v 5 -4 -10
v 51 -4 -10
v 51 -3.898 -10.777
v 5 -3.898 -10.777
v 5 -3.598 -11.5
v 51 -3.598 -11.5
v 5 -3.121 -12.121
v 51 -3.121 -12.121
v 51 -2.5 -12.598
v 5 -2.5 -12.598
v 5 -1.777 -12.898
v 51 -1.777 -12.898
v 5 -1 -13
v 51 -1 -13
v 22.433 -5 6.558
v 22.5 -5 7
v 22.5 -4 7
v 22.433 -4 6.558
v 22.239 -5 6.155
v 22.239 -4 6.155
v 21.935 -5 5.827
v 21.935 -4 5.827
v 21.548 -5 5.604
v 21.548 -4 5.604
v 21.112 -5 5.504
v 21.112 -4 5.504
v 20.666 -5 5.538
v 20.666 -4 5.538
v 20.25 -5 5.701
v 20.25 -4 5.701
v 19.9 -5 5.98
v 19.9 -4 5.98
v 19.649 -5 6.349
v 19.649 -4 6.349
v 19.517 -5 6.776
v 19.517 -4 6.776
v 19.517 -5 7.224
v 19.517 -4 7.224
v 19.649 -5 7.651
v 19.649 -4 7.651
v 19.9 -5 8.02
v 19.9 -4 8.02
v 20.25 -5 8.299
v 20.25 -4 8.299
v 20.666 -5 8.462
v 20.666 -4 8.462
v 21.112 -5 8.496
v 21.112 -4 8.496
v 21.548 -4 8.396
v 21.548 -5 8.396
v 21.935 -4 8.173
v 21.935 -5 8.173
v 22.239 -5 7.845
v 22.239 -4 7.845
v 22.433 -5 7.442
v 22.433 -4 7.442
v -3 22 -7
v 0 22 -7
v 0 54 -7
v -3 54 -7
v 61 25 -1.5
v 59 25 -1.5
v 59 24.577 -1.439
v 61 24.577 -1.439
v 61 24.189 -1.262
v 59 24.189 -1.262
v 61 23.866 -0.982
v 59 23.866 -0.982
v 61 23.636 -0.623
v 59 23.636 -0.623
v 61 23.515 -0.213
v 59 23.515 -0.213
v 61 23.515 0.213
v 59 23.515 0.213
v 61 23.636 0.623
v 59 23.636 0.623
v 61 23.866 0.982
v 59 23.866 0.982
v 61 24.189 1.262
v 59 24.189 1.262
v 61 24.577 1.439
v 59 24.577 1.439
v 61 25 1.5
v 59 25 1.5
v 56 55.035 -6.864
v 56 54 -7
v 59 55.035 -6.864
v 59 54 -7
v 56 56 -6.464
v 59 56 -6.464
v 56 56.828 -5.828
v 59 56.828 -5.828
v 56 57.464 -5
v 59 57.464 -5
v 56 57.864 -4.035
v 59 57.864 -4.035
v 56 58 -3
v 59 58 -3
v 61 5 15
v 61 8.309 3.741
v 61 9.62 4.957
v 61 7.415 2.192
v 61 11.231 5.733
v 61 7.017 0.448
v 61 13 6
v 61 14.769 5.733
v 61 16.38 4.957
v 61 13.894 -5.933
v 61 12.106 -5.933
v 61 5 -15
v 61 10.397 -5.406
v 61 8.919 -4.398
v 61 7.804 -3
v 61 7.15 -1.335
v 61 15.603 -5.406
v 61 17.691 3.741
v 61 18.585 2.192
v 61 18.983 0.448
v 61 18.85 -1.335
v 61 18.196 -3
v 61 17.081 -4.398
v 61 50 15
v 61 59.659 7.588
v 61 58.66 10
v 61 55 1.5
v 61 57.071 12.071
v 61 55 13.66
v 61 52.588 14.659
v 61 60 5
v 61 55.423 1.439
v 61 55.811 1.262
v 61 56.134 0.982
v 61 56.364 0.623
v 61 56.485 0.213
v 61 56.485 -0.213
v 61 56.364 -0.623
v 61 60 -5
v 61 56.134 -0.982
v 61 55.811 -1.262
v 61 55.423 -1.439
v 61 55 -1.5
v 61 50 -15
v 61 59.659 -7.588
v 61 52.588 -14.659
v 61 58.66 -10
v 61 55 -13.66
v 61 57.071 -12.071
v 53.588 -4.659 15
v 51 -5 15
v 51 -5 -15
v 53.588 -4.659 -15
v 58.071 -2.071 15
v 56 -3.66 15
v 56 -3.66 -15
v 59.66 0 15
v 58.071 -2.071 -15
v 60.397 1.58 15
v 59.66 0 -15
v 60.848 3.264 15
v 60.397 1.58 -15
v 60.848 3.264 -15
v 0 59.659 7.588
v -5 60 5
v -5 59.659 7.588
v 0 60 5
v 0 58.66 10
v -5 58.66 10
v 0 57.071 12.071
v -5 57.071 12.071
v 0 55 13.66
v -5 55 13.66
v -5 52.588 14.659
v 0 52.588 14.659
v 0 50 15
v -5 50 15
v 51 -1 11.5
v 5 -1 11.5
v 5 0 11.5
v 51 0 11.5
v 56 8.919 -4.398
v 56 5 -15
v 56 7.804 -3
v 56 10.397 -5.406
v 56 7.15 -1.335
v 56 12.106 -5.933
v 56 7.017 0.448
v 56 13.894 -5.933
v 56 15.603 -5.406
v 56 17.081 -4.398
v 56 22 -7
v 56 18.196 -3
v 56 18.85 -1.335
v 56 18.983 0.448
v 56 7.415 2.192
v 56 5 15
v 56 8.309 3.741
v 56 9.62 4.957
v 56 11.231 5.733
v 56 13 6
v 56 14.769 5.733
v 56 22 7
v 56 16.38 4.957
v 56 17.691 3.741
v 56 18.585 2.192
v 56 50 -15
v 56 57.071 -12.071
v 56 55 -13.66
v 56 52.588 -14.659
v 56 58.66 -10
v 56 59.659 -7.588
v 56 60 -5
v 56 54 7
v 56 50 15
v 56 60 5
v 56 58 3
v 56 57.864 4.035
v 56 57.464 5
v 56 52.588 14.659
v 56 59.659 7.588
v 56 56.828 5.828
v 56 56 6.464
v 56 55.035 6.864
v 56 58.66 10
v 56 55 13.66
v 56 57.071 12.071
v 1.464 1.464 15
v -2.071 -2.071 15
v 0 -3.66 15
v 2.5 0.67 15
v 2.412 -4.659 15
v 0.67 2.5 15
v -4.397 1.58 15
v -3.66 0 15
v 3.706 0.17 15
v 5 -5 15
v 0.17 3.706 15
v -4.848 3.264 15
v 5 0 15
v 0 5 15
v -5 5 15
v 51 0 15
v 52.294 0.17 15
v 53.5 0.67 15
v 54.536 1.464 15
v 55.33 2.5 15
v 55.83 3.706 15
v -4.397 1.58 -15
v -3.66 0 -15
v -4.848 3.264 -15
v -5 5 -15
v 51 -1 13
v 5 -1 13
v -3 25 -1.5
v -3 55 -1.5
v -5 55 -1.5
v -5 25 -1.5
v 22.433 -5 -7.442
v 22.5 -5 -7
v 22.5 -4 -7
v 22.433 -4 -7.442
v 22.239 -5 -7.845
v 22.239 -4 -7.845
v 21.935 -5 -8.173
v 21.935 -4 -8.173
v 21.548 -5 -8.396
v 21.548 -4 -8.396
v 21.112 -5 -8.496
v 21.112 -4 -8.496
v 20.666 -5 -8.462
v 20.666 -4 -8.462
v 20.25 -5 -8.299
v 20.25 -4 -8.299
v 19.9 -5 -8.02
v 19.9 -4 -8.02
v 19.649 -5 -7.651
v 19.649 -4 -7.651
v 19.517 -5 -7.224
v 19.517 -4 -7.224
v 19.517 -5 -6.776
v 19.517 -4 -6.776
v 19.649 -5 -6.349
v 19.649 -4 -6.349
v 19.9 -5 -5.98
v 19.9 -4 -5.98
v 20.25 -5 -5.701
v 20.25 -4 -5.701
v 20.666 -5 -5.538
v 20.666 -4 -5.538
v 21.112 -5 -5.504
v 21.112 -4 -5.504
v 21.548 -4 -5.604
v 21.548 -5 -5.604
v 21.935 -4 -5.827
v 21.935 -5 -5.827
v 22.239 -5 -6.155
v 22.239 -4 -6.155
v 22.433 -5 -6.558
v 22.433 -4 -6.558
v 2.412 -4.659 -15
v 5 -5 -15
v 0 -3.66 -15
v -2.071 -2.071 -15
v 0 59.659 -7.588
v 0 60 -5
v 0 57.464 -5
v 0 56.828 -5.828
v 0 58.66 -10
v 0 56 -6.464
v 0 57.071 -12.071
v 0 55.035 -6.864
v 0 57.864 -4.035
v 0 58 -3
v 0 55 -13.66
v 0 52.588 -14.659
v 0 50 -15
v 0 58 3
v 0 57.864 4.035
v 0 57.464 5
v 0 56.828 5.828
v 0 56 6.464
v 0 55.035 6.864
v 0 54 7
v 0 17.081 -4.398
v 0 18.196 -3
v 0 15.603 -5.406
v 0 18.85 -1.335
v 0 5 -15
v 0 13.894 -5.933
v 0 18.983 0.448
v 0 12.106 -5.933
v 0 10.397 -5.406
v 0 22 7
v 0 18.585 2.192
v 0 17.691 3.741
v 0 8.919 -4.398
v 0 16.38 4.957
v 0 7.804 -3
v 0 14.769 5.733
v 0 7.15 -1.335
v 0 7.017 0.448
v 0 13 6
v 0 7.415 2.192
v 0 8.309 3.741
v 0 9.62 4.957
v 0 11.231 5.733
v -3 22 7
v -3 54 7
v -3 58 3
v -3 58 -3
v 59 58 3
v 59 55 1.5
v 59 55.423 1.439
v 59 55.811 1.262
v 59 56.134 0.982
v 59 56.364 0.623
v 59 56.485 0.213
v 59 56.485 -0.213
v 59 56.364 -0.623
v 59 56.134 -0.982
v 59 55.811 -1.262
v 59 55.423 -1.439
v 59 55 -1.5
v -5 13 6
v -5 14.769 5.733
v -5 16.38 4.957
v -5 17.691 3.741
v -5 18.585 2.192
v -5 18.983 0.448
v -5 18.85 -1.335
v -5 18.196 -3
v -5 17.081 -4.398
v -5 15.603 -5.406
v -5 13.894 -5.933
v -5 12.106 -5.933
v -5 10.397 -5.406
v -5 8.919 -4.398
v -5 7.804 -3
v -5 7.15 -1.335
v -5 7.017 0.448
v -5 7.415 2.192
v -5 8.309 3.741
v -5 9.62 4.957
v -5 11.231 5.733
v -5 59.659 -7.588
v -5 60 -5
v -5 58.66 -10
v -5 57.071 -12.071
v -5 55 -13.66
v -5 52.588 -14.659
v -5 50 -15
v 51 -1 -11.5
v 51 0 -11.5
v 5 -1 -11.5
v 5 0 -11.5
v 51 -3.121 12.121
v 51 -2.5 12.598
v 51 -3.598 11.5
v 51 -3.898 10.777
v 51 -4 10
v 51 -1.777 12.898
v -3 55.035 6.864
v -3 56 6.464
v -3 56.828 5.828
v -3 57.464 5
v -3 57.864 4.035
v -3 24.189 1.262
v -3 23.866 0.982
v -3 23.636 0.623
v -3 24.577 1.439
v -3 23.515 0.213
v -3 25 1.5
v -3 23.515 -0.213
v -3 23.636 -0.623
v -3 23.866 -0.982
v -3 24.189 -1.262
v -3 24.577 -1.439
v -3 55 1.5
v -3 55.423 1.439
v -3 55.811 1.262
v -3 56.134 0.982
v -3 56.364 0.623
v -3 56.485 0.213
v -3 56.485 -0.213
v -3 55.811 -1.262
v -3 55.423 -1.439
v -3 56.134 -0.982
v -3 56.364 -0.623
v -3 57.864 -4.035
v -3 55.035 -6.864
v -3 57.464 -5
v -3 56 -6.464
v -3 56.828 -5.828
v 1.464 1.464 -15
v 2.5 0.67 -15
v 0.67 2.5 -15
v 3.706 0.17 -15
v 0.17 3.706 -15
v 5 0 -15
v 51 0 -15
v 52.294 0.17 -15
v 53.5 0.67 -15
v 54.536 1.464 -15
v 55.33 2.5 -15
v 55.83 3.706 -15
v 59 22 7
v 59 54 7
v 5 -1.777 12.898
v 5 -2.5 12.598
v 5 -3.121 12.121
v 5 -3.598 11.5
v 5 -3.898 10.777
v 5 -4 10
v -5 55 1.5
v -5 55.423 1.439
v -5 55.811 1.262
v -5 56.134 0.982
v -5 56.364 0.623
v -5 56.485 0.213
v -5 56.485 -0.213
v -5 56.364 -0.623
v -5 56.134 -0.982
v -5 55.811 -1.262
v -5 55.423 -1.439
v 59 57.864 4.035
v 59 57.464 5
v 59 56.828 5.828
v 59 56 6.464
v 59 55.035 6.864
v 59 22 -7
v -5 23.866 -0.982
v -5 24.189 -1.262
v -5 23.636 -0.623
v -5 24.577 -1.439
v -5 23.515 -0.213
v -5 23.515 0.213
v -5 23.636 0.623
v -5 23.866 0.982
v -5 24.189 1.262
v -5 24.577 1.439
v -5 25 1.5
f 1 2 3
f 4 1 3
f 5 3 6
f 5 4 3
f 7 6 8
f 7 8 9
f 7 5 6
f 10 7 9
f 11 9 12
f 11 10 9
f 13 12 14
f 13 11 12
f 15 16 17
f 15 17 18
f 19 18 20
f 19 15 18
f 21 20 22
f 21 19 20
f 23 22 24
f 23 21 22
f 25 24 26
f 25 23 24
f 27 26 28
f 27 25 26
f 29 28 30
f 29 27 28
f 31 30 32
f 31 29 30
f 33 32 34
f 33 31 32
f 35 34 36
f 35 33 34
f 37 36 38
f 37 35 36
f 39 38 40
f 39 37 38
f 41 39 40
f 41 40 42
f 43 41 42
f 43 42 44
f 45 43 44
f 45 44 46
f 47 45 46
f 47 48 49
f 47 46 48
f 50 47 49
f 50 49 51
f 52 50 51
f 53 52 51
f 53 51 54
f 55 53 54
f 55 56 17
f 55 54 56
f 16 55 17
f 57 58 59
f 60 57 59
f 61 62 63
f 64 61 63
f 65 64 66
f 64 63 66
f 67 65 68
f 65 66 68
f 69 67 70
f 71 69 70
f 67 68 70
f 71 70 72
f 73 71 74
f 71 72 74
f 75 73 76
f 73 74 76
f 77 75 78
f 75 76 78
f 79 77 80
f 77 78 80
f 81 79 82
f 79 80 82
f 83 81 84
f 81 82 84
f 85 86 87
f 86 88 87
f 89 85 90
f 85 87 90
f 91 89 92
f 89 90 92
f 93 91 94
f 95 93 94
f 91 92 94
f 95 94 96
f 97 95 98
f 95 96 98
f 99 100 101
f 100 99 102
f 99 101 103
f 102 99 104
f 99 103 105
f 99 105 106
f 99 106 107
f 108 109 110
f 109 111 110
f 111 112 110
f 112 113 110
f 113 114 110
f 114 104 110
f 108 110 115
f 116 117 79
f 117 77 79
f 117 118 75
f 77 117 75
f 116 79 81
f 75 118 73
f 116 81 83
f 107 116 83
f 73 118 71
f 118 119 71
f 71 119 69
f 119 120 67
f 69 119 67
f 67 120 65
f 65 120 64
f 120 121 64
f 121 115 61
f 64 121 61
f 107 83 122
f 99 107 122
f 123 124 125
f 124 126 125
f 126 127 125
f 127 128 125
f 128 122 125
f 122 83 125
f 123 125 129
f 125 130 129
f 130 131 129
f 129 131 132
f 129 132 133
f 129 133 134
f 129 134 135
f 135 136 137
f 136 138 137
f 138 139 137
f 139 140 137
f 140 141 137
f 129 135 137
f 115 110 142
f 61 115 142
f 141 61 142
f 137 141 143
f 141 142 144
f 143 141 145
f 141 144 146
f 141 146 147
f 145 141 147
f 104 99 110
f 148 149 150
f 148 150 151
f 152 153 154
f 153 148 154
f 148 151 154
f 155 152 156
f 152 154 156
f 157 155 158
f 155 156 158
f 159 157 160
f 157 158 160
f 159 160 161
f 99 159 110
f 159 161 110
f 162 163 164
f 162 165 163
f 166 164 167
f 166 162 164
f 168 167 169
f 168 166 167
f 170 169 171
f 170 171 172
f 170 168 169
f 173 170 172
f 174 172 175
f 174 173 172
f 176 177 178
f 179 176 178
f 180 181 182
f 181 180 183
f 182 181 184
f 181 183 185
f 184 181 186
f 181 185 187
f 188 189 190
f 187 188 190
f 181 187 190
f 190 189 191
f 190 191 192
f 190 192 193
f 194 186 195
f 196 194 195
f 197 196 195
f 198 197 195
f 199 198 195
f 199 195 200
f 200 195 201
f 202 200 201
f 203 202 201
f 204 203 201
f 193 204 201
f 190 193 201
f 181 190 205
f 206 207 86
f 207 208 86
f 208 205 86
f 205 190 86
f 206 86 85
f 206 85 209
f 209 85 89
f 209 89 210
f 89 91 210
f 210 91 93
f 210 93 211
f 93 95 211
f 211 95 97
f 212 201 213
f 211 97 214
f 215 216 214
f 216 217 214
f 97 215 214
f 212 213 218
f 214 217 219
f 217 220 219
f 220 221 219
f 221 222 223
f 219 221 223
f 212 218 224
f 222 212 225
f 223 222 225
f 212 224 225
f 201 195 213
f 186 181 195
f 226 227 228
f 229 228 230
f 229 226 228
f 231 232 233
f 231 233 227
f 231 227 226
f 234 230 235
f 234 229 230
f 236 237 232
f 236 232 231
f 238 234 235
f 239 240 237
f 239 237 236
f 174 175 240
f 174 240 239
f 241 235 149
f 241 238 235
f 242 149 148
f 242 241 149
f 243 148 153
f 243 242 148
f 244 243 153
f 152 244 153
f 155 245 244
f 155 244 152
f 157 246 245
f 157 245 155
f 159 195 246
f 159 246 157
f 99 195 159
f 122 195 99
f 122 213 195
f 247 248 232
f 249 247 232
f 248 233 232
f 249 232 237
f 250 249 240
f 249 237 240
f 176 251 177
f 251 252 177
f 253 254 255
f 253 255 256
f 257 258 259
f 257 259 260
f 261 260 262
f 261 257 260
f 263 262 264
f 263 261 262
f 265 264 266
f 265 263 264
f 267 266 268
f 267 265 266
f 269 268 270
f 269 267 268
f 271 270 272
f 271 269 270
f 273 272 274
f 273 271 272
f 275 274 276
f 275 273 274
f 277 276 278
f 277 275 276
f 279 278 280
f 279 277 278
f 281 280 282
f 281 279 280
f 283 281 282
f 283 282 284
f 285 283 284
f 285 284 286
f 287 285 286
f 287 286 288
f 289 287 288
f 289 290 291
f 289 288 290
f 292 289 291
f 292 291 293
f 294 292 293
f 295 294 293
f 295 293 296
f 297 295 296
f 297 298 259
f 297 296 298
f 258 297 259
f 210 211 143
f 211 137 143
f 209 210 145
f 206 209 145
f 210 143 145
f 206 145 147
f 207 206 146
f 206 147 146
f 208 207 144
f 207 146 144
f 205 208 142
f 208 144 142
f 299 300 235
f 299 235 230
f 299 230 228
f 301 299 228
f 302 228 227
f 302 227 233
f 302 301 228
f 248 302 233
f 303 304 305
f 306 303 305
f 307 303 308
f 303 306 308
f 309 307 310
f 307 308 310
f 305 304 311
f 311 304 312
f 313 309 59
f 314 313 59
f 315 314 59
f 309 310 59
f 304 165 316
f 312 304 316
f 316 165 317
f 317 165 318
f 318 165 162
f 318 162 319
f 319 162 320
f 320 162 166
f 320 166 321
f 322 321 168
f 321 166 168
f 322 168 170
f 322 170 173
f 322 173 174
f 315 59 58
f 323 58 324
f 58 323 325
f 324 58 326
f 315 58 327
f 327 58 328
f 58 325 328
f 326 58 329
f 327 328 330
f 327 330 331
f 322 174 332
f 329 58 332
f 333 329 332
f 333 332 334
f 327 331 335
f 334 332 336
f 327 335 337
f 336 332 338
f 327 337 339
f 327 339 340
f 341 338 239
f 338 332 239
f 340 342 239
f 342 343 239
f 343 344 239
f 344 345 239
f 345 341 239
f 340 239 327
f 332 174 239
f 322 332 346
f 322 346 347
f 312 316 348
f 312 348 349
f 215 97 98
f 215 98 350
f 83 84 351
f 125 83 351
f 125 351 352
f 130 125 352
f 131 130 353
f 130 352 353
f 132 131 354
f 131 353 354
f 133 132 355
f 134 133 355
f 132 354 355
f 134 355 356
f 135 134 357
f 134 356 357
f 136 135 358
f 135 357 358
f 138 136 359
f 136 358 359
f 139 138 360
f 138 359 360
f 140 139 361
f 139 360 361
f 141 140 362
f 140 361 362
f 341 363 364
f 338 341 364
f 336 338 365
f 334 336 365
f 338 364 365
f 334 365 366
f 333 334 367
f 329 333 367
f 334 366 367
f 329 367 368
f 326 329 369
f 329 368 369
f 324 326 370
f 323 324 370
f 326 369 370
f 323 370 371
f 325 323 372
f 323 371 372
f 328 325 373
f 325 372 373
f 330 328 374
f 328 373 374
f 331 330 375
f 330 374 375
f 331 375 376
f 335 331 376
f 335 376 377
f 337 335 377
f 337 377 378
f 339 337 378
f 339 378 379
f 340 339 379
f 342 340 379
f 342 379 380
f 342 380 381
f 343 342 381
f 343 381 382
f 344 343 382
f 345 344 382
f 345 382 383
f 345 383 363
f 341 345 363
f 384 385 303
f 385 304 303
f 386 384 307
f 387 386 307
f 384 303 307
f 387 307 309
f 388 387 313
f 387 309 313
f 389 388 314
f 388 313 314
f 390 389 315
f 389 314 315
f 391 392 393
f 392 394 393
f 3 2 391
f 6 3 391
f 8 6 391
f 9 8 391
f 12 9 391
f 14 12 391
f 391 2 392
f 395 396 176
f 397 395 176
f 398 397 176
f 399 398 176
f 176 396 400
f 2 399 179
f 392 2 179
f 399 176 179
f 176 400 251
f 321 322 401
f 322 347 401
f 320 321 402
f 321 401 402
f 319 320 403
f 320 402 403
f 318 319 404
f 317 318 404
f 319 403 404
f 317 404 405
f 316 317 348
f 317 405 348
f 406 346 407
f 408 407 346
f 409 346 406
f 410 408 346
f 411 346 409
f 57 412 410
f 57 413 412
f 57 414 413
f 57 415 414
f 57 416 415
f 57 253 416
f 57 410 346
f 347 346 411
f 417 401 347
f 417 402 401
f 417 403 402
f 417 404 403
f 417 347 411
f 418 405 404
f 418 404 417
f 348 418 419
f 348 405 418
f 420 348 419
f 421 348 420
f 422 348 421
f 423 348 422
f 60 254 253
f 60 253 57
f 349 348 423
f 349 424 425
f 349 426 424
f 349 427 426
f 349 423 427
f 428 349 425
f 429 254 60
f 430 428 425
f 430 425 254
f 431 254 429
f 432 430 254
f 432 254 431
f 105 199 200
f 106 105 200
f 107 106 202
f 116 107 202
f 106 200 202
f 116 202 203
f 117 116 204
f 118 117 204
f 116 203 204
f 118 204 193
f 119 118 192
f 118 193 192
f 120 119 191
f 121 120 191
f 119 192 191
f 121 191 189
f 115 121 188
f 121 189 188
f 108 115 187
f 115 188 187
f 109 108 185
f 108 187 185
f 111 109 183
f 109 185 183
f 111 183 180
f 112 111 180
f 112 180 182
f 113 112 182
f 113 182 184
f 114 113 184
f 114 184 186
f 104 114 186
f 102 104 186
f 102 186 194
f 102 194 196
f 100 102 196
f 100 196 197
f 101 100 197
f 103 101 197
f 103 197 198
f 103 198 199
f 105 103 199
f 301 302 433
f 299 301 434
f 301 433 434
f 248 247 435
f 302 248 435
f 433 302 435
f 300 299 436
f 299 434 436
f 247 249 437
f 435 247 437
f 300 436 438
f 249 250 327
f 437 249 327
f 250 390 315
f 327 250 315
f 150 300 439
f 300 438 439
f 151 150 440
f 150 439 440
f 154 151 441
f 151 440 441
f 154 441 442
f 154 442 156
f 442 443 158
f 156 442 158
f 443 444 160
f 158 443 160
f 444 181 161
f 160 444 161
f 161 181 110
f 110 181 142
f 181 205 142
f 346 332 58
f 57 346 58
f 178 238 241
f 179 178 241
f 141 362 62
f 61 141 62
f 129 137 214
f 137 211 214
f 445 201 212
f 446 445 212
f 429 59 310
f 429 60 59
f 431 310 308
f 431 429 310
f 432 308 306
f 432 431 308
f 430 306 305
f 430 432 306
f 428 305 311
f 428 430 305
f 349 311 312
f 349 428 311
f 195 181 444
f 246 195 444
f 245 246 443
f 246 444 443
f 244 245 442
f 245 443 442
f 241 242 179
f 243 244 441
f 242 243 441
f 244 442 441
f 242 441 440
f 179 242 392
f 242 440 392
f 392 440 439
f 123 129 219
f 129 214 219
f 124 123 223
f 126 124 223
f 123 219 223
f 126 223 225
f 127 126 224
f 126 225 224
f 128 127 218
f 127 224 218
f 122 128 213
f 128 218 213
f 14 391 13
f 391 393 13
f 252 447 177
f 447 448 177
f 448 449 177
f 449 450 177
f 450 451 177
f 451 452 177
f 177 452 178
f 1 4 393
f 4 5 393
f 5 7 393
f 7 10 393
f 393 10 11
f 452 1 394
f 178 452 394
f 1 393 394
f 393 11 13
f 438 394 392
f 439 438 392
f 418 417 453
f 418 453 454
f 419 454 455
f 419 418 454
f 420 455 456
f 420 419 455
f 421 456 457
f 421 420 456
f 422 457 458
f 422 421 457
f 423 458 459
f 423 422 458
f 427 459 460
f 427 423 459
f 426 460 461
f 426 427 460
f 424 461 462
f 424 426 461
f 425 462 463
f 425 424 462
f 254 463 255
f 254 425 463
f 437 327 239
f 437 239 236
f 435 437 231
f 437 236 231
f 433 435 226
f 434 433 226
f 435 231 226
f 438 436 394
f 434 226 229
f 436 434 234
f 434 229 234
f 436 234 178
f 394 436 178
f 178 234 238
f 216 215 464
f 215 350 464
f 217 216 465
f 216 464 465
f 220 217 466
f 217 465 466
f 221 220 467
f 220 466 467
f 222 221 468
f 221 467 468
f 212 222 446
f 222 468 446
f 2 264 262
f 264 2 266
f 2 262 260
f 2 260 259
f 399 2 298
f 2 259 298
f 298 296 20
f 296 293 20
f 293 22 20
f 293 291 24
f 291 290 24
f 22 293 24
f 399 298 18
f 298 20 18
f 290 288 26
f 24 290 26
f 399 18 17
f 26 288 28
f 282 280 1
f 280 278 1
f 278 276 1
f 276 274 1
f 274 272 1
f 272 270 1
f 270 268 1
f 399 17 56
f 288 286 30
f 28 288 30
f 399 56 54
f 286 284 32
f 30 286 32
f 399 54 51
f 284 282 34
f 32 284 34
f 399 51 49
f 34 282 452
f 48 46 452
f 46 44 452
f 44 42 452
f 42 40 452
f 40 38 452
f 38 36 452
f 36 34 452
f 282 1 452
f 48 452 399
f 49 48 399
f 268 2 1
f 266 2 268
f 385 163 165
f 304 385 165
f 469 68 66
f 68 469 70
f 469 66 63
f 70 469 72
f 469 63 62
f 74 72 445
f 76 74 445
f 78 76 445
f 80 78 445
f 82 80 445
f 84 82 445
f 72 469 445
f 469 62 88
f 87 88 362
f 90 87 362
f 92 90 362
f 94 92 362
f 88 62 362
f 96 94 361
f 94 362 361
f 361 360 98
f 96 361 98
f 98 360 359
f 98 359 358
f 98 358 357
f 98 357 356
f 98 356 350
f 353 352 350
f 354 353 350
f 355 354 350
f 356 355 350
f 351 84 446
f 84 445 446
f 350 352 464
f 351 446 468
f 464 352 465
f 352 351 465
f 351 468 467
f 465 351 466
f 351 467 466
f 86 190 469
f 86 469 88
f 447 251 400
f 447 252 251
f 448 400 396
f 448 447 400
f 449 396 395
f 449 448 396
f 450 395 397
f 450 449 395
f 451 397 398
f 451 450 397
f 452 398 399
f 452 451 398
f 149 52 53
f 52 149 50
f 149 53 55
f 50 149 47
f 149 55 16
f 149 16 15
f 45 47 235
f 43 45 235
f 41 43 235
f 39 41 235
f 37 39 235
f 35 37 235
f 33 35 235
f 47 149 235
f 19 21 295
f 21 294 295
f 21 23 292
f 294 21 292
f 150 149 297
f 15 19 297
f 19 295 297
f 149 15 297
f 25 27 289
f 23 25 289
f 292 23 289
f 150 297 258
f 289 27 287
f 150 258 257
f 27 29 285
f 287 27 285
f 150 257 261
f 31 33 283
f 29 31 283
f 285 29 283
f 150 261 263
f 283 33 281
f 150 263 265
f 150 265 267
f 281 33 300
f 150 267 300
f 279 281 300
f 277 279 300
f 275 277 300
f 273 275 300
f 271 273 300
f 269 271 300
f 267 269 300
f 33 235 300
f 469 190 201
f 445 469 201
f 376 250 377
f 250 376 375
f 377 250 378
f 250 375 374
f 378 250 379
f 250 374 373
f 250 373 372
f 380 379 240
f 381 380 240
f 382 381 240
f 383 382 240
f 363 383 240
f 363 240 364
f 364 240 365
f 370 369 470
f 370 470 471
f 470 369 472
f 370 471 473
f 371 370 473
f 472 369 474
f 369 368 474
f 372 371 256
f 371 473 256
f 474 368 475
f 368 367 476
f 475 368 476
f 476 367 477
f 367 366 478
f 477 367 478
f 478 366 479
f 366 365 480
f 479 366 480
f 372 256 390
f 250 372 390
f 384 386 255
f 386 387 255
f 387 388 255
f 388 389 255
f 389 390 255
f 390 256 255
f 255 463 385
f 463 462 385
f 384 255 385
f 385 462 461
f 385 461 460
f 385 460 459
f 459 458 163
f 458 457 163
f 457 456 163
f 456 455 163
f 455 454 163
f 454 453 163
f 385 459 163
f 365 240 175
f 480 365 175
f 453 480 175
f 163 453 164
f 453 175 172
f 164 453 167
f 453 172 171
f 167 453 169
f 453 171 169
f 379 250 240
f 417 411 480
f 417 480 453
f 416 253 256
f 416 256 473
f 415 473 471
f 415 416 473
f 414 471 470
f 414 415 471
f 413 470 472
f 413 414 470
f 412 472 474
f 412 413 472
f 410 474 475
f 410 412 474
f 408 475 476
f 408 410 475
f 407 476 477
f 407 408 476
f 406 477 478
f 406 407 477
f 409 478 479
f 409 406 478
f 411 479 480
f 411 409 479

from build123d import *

# Parameters (mm, degrees)
BOSS_EXTRUDE1_DEPTH   = 15
CUT_EXTRUDE1_DEPTH    = 30
SKETCH5_W             = 14
SKETCH5_H             = 36
CUT_EXTRUDE2_DEPTH    = 3
SKETCH7_R             = 1.5
CUT_EXTRUDE3_DEPTH    = 90
MIRROR1_START         = -4
MIRROR1_DEPTH         = 9
MIRROR1_START_2       = 56
MIRROR1_2_OUTLINE_W   = 60
MIRROR1_2_OUTLINE_H   = 30
MIRROR1_2_OUTLINE_W_2 = 36
MIRROR1_2_OUTLINE_H_2 = 14
MIRROR1_2_DEPTH       = 3
MIRROR1_START_3       = 59
MIRROR1_3_OUTLINE_W   = 36
MIRROR1_3_OUTLINE_H   = 14
MIRROR1_3_DEPTH       = 2
MIRROR1_4_DEPTH       = 9
MIRROR1_START_4       = 51
MIRROR1_5_DEPTH       = 4.358898944
MIRROR1_START_5       = 22.5000001
MIRROR1_6_DEPTH       = 28.4999999
MIRROR1_START_6       = -15
MIRROR1_7_OUTLINE_W   = 2
MIRROR1_7_OUTLINE_H   = 2
MIRROR1_7_DEPTH       = 30
MIRROR1_8_OUTLINE_W   = 2
MIRROR1_8_OUTLINE_H   = 36
MIRROR1_8_DEPTH       = 8
MIRROR1_START_7       = 7
MIRROR1_9_OUTLINE_W   = 2
MIRROR1_9_OUTLINE_H   = 36
MIRROR1_9_DEPTH       = 8
MIRROR1_START_8       = -6
MIRROR1_10_OUTLINE_R  = 1.5
MIRROR1_10_DEPTH      = 3
CUT_EXTRUDE5_START    = -70
CUT_EXTRUDE5_DEPTH    = 70
BOSS_EXTRUDE2_START   = -28
BOSS_EXTRUDE2_DEPTH   = 26
FILLET1_R             = 10
FILLET2_R             = 4
FILLET3_R             = 3
SKETCH9_R             = 6
CUT_EXTRUDE6_DEPTH    = 83


with BuildPart() as part:
    # Sketch1 → Boss-Extrude1 (new, symmetric)
    with BuildSketch(Plane.XY):
        with BuildLine():
            Line((5, 0), (60, 0))
            Line((60, 0), (60, -5))
            Line((60, -5), (5, -5))
            ThreePointArc((5, -5), (-2.071067812, -2.071067812), (-5, 5))
            Line((-5, 5), (-5, 60))
            Line((-5, 60), (0, 60))
            Line((0, 60), (0, 5))
            ThreePointArc((0, 5), (1.464466094, 1.464466094), (5, 0))
        make_face()
    extrude(amount=BOSS_EXTRUDE1_DEPTH, both=True)

    # Cut-Sweep1: sweep along a path in Sketch3
    with BuildLine(Plane(origin=(0, 0, 0), x_dir=(1, 0, 0), z_dir=(0, 1, 0))) as cut_sweep1_path:
        Line((60, 0), (5, 0))
    # Sketch2 → Cut-Sweep1 (sweep, cut)
    with BuildSketch(Plane(origin=(60, 0, 0), x_dir=(0, 0, -1), z_dir=(1, 0, 0))):
        Polygon((-11.5, 0), (-11.5, -1), (-13, -1), (-13, -4), (13, -4), (13, -1), (11.5, -1), (11.5, 0), align=None)
    sweep(path=cut_sweep1_path.line, mode=Mode.SUBTRACT)

    # Sketch4 → Cut-Extrude1 (cut)
    with BuildSketch(Plane(origin=(0, 0, 0), x_dir=(0, 0, -1), z_dir=(1, 0, 0))):
        with BuildLine():
            Line((1.5, 55), (1.5, 25))
            ThreePointArc((1.5, 25), (0, 23.5), (-1.5, 25))
            Line((-1.5, 25), (-1.5, 55))
            ThreePointArc((-1.5, 55), (0, 56.5), (1.5, 55))
        make_face()
    extrude(amount=-CUT_EXTRUDE1_DEPTH, mode=Mode.SUBTRACT)

    # Sketch5 → Cut-Extrude2 (cut)
    with BuildSketch(Plane(origin=(0, 0, 0), x_dir=(0, 0, -1), z_dir=(1, 0, 0))):
        with Locations((0, 40)):
            Rectangle(SKETCH5_W, SKETCH5_H)
    extrude(amount=-CUT_EXTRUDE2_DEPTH, mode=Mode.SUBTRACT)

    # Sketch7 → Cut-Extrude3 (cut, through all)
    with BuildSketch(Plane(origin=(0, -4, 0), x_dir=(1, 0, 0), z_dir=(0, 1, 0))):
        with Locations(Location((35, 7, 0), (0, 0, 270))):
            Circle(SKETCH7_R)
        with Locations(Location((35, -7, 0), (0, 0, 270))):
            Circle(SKETCH7_R)
    extrude(amount=-CUT_EXTRUDE3_DEPTH, mode=Mode.SUBTRACT)

    # Mirror1: read off the stored shape, not the designer's step
    # Mirror1 outline → Mirror1 (cut)
    with BuildSketch(Plane.YZ.offset(MIRROR1_START)):
        Polygon((0, -11.5), (0, 11.5), (-1, 11.5), (-1, 13), (-4, 13), (-4, -13), (-1, -13), (-1, -11.5), align=None)
    extrude(amount=MIRROR1_DEPTH, mode=Mode.SUBTRACT)

    # Mirror1 2 outline → Mirror1 2 (add)
    with BuildSketch(Plane.YZ.offset(MIRROR1_START_2)):
        with Locations((30, 0)):
            Rectangle(MIRROR1_2_OUTLINE_W, MIRROR1_2_OUTLINE_H)
        with Locations((40, 0)):
            Rectangle(MIRROR1_2_OUTLINE_W_2, MIRROR1_2_OUTLINE_H_2, mode=Mode.SUBTRACT)
    extrude(amount=MIRROR1_2_DEPTH)

    # Mirror1 3 outline → Mirror1 3 (add)
    with BuildSketch(Plane.YZ.offset(MIRROR1_START_3)):
        with Locations((40, 0)):
            Rectangle(MIRROR1_3_OUTLINE_W, MIRROR1_3_OUTLINE_H)
        with BuildLine():
            Line((25, 1.5), (55, 1.5))
            ThreePointArc((55, 1.5), (56.5, 0), (55, -1.5))
            Line((55, -1.5), (25, -1.5))
            ThreePointArc((25, -1.5), (23.5, 0), (25, 1.5))
        make_face(mode=Mode.SUBTRACT)
    extrude(amount=MIRROR1_3_DEPTH)

    # Mirror1 4 outline → Mirror1 4 (add)
    with BuildSketch(Plane.YZ.offset(MIRROR1_START)):
        Polygon((-1, 11.5), (0, 11.5), (0, 15), (-5, 15), (-5, -15), (0, -15), (0, -11.5), (-1, -11.5), (-1, -13), (-4, -13), (-4, 13), (-1, 13), align=None)
    extrude(amount=MIRROR1_4_DEPTH)

    # Mirror1 5 outline → Mirror1 5 (add)
    with BuildSketch(Plane.YZ.offset(MIRROR1_START_4)):
        Polygon((0, -11.5), (0, 11.5), (-1, 11.5), (-1, 13), (-4, 13), (-4, -13), (-1, -13), (-1, -11.5), align=None)
    extrude(amount=MIRROR1_5_DEPTH)

    # Mirror1 6 outline → Mirror1 6 (add)
    with BuildSketch(Plane.YZ.offset(MIRROR1_START_5)):
        Polygon((-1, 11.5), (0, 11.5), (0, 15), (-5, 15), (-5, -15), (0, -15), (0, -11.5), (-1, -11.5), (-1, -13), (-4, -13), (-4, 13), (-1, 13), align=None)
    extrude(amount=MIRROR1_6_DEPTH)

    # Mirror1 7 outline → Mirror1 7 (add)
    with BuildSketch(Plane.XY.offset(MIRROR1_START_6)):
        with BuildLine():
            Line((56, 0), (56, 5))
            ThreePointArc((56, 5), (54.535533906, 1.464466094), (51, 0))
            Line((51, 0), (55.358898944, 0))
            Line((55.358898944, 0), (55.358898944, -4))
            ThreePointArc((55.358898944, -4), (59.473163206, -0.310885546), (61, 5))
            Line((61, 5), (61, 22))
            Line((61, 22), (59, 22))
            Line((59, 22), (59, 0))
            Line((59, 0), (56, 0))
        make_face()
        with Locations((60, 59)):
            Rectangle(MIRROR1_7_OUTLINE_W, MIRROR1_7_OUTLINE_H)
    extrude(amount=MIRROR1_7_DEPTH)

    # Mirror1 8 outline → Mirror1 8 (add)
    with BuildSketch(Plane.XY.offset(MIRROR1_START_6)):
        with Locations((60, 40)):
            Rectangle(MIRROR1_8_OUTLINE_W, MIRROR1_8_OUTLINE_H)
    extrude(amount=MIRROR1_8_DEPTH)

    # Mirror1 9 outline → Mirror1 9 (add)
    with BuildSketch(Plane.XY.offset(MIRROR1_START_7)):
        with Locations((60, 40)):
            Rectangle(MIRROR1_9_OUTLINE_W, MIRROR1_9_OUTLINE_H)
    extrude(amount=MIRROR1_9_DEPTH)

    # Mirror1 10 outline → Mirror1 10 (cut)
    with BuildSketch(Plane(origin=(0, 0, 0), x_dir=(1, 0, 0), z_dir=(0, 1, 0)).offset(MIRROR1_START_8)):
        with Locations((21, -7)):
            Circle(MIRROR1_10_OUTLINE_R)
        with Locations((21, 7)):
            Circle(MIRROR1_10_OUTLINE_R)
    extrude(amount=MIRROR1_10_DEPTH, mode=Mode.SUBTRACT)

    # Sketch8 → Cut-Extrude5 (cut)
    with BuildSketch(Plane.XY.offset(15).offset(CUT_EXTRUDE5_START)):
        with BuildLine():
            Line((65.755683461, 5), (61, 5))
            ThreePointArc((61, 5), (60.659258263, 2.411809549), (59.660254038, 0))
            Line((59.660254038, 0), (60, 0))
            Line((60, 0), (60, -5))
            Line((60, -5), (51, -5))
            Line((51, -5), (51, -9.755683461))
            ThreePointArc((51, -9.755683461), (61.433843836, -5.433843836), (65.755683461, 5))
        make_face()
        with BuildLine():
            ThreePointArc((59.660254038, 0), (56, -3.660254038), (51, -5))
            Line((51, -5), (60, -5))
            Line((60, -5), (60, 0))
            Line((60, 0), (59.660254038, 0))
        make_face()
        with BuildLine():
            Line((-4, -5), (5, -5))
            ThreePointArc((5, -5), (0, -3.660254038), (-3.660254038, 0))
            Line((-3.660254038, 0), (-4, 0))
            Line((-4, 0), (-4, -5))
        make_face()
    extrude(amount=CUT_EXTRUDE5_DEPTH, mode=Mode.SUBTRACT)

    # Sketch8<3> → Boss-Extrude2 (add)
    with BuildSketch(Plane.XY.offset(15).offset(BOSS_EXTRUDE2_START)):
        with BuildLine():
            ThreePointArc((-3.660254038, 0), (0, -3.660254038), (5, -5))
            Line((5, -5), (5, 0))
            ThreePointArc((5, 0), (1.464466094, 1.464466094), (0, 5))
            Line((0, 5), (-5, 5))
            ThreePointArc((-5, 5), (-4.659258263, 2.411809549), (-3.660254038, 0))
        make_face()
    extrude(amount=BOSS_EXTRUDE2_DEPTH)

    # Fillet1
    fillet1_edges = [part.edges().sort_by_distance(p)[0] for p in [
        (58.5, 60, -15),
        (58.5, 60, 15),
        (-2.5, 60, 15),
        (-2.5, 60, -15),
    ]]
    fillet(fillet1_edges, radius=FILLET1_R)

    # Fillet2
    fillet2_edges = [part.edges().sort_by_distance(p)[0] for p in [
        (57.5, 58, 7),
        (57.5, 58, -7),
        (-1.5, 58, 7),
        (-1.5, 58, -7),
    ]]
    fillet(fillet2_edges, radius=FILLET2_R)

    # Fillet3
    fillet3_edges = [part.edges().sort_by_distance(p)[0] for p in [
        (28, -4, 13),
        (28, -4, -13),
    ]]
    fillet(fillet3_edges, radius=FILLET3_R - 0.0001)  # a hair under: the kernel refuses the full size

    # Sketch9 → Cut-Extrude6 (cut)
    with BuildSketch(Plane.ZY.offset(5)):
        with Locations((0, 13)):
            Circle(SKETCH9_R)
    extrude(amount=-CUT_EXTRUDE6_DEPTH, mode=Mode.SUBTRACT)


solid = part.part
